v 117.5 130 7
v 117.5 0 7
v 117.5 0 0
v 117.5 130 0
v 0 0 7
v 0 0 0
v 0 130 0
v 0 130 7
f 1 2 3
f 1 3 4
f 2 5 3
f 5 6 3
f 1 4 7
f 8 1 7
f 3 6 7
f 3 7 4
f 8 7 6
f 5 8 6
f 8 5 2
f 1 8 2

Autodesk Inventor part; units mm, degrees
ref_plane "YZ Plane" through (0, 0, 0) normal (1, 0, 0) x (0, 1, 0)
ref_plane "XZ Plane" through (0, 0, 0) normal (0, 1, 0) x (-1, 0, 0)
ref_plane "XY Plane" through (0, 0, 0) normal (0, 0, 1) x (1, 0, 0)
sketch "Sketch1" plane through (0, 0, 0) normal (0, 0, 1) x (1, 0, 0)
  line L0 (0, 0) -> (335, 0)
  line L1 (335, 0) -> (335, 130)
  line L2 (335, 130) -> (0, 130)
  line L3 (0, 130) -> (0, 0)
  dimension "d0" = 335
  dimension "d1" = 130
extrude "Extrusion1" add sketch "Sketch1" along normal blind 7
sketch "Sketch2" plane through (0, 0, 7) normal (0, 0, 1) x (1, 0, 0)
  line L0 (0, 0) -> (335, 0) projected
  line L1 (0, 0) -> (127.5, 0)
  line L2 (127.5, 0) -> (207.5, 0)
  line L3 (207.5, 0) -> (335, 0)
  line L4 (335, 130) -> (0, 130) projected
  line L5 (0, 0) -> (167.5, 0)
  line L6 (167.5, 0) -> (117.5, 0)
  line L7 (117.5, 0) -> (217.5, 0)
  line L8 (217.5, 0) -> (217.5, 130)
  line L9 (117.5, 0) -> (117.5, 130)
  line L10 (117.5, 0) -> (0, 0)
  line L11 (217.5, 0) -> (335, 0)
  dimension "d7" = 100
extrude "Extrusion2" cut sketch "Sketch2" against normal blind 10
sketch "Sketch3" plane through (0, 0, 7) normal (0, 0, 1) x (1, 0, 0)
  line L0 (335, 130) -> (217.5, 130) projected
  line L1 (335, 0) -> (335, 130) projected
  line L2 (217.5, 130) -> (335, 130)
  line L3 (335, 130) -> (335, 0)
  line L4 (335, 0) -> (217.5, 0)
  line L5 (217.5, 0) -> (217.5, 130)
  point P0 (0, 0)
extrude "Extrusion3" cut sketch "Sketch3" against normal blind 10
properties part number "Frente-inferior-E-D" material "Polycarbonate, Clear"
